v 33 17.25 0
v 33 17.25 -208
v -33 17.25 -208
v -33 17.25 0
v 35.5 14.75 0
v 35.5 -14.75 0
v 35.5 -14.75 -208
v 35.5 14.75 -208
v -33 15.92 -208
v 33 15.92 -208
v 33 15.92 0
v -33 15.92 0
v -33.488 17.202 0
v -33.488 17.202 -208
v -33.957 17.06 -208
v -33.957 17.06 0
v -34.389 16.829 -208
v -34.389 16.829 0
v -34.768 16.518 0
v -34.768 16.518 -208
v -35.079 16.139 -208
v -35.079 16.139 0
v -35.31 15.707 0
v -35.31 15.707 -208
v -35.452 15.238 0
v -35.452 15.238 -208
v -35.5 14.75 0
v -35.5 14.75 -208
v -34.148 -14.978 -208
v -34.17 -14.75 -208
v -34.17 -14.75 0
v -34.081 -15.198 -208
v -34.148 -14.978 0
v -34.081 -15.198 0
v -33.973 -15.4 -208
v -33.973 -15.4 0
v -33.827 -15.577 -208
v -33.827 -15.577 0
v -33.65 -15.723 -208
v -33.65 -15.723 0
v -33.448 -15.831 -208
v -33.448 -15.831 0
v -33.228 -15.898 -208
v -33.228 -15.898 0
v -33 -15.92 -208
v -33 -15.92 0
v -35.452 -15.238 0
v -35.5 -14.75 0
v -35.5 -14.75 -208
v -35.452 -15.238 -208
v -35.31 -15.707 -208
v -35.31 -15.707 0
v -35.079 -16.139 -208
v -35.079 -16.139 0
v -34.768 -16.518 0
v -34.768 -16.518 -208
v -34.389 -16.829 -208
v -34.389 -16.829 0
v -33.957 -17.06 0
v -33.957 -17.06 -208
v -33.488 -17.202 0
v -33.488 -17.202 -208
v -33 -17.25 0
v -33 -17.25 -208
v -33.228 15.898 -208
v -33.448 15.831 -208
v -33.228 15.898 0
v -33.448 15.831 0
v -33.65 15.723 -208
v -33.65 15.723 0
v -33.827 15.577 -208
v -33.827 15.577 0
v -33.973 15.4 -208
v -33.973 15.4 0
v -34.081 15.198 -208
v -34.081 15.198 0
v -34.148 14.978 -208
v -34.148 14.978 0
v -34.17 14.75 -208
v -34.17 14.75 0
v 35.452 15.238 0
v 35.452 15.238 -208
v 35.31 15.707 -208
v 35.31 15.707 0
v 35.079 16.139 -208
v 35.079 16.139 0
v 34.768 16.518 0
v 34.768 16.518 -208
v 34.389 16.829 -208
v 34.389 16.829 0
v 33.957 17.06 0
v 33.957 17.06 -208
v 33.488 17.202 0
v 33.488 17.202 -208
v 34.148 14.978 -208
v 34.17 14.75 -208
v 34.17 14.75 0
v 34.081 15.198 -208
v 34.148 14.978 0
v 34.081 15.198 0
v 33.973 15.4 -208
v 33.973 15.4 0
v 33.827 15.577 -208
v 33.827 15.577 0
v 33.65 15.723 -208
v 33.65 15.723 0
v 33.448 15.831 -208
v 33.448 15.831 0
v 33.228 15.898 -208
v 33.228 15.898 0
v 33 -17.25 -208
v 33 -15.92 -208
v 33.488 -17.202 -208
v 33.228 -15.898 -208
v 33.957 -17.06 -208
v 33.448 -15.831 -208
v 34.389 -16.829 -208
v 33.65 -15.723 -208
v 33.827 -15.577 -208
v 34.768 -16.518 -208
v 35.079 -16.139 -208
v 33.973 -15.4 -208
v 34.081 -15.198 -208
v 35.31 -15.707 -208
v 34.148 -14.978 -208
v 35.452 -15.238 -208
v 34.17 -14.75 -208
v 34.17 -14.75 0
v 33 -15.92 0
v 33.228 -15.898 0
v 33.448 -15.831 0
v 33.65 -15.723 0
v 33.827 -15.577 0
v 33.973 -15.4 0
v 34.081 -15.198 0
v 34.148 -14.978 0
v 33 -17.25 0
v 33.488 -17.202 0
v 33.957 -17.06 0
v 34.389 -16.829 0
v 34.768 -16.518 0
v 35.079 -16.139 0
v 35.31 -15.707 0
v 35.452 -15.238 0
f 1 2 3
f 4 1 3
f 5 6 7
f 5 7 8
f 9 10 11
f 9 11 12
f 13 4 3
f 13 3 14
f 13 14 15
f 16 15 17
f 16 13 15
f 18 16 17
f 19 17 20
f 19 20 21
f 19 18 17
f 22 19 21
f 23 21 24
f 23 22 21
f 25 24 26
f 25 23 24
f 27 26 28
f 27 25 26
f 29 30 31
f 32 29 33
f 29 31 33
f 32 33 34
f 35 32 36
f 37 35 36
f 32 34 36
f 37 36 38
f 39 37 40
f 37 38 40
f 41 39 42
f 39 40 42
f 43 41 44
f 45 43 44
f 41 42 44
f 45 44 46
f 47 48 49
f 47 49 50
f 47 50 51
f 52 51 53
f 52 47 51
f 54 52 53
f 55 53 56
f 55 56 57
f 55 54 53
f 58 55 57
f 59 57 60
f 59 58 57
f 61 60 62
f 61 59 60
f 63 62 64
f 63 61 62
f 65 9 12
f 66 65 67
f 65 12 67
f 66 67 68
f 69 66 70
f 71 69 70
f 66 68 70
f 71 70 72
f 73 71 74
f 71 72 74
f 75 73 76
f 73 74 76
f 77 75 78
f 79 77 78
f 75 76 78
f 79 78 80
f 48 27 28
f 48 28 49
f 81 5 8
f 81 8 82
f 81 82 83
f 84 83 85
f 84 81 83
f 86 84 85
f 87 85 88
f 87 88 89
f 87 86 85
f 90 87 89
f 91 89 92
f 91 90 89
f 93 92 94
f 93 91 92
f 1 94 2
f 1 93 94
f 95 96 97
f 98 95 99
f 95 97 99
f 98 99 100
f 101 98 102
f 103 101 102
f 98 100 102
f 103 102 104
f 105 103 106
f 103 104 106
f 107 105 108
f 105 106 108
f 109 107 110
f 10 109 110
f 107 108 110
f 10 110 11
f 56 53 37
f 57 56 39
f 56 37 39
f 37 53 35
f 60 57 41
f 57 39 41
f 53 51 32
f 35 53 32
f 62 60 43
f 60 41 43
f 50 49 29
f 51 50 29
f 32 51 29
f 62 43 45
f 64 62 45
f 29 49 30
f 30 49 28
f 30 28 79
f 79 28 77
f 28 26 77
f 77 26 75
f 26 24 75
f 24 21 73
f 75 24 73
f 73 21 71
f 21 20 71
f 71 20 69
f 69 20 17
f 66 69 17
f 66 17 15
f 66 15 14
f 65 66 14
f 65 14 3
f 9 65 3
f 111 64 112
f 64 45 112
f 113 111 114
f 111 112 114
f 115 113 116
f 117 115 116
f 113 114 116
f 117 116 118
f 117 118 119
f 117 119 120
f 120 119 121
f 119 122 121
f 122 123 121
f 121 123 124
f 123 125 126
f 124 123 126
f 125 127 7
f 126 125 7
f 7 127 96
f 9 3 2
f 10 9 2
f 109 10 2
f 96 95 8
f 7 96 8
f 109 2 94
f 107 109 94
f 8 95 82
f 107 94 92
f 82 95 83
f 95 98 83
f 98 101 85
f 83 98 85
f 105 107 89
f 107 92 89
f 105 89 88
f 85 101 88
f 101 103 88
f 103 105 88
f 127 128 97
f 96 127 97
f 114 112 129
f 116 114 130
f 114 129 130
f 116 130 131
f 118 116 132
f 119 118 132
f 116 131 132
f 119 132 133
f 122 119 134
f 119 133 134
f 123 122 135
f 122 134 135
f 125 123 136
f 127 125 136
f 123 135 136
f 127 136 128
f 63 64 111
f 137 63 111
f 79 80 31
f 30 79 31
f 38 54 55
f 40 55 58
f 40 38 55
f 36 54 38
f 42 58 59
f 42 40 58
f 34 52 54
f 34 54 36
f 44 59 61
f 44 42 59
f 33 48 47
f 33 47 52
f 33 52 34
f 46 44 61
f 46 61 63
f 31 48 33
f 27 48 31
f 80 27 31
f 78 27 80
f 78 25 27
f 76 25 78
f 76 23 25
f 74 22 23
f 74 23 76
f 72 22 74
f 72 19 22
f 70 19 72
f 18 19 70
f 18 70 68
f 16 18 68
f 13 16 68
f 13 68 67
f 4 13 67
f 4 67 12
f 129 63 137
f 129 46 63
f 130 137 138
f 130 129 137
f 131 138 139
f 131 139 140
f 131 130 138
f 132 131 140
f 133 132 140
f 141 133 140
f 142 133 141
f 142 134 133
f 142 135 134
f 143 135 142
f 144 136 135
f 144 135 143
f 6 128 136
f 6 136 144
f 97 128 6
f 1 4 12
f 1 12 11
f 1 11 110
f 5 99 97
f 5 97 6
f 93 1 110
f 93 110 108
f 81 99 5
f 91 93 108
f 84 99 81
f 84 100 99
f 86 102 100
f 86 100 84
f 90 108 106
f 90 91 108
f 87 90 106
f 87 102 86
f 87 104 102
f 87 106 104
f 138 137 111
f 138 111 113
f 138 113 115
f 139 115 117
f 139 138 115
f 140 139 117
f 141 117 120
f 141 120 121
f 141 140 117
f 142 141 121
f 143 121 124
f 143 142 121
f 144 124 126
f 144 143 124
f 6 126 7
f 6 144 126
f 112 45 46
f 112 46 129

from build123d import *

# Parameters (mm, degrees)
BOSS_EXTRUDE1_DEPTH = 208
SHELL1_T            = -1.33


with BuildPart() as part:
    # Sketch1 → Boss-Extrude1 (new body)
    with BuildSketch(Plane.XY):
        with BuildLine():
            Line((-33, -17.25), (33, -17.25))
            ThreePointArc((33, -17.25), (34.767766953, -16.517766953), (35.5, -14.75))
            Line((35.5, -14.75), (35.5, 14.75))
            ThreePointArc((35.5, 14.75), (34.767766953, 16.517766953), (33, 17.25))
            Line((33, 17.25), (-33, 17.25))
            ThreePointArc((-33, 17.25), (-34.767766953, 16.517766953), (-35.5, 14.75))
            Line((-35.5, 14.75), (-35.5, -14.75))
            ThreePointArc((-35.5, -14.75), (-34.767766953, -16.517766953), (-33, -17.25))
        make_face()
    extrude(amount=-BOSS_EXTRUDE1_DEPTH)

    # Shell1
    shell1_openings = [part.faces().sort_by_distance(p)[0] for p in [
        (0, 0, -208),
        (0, 0, 0),
    ]]
    offset(amount=SHELL1_T, openings=shell1_openings, kind=Kind.INTERSECTION)


solid = part.part
